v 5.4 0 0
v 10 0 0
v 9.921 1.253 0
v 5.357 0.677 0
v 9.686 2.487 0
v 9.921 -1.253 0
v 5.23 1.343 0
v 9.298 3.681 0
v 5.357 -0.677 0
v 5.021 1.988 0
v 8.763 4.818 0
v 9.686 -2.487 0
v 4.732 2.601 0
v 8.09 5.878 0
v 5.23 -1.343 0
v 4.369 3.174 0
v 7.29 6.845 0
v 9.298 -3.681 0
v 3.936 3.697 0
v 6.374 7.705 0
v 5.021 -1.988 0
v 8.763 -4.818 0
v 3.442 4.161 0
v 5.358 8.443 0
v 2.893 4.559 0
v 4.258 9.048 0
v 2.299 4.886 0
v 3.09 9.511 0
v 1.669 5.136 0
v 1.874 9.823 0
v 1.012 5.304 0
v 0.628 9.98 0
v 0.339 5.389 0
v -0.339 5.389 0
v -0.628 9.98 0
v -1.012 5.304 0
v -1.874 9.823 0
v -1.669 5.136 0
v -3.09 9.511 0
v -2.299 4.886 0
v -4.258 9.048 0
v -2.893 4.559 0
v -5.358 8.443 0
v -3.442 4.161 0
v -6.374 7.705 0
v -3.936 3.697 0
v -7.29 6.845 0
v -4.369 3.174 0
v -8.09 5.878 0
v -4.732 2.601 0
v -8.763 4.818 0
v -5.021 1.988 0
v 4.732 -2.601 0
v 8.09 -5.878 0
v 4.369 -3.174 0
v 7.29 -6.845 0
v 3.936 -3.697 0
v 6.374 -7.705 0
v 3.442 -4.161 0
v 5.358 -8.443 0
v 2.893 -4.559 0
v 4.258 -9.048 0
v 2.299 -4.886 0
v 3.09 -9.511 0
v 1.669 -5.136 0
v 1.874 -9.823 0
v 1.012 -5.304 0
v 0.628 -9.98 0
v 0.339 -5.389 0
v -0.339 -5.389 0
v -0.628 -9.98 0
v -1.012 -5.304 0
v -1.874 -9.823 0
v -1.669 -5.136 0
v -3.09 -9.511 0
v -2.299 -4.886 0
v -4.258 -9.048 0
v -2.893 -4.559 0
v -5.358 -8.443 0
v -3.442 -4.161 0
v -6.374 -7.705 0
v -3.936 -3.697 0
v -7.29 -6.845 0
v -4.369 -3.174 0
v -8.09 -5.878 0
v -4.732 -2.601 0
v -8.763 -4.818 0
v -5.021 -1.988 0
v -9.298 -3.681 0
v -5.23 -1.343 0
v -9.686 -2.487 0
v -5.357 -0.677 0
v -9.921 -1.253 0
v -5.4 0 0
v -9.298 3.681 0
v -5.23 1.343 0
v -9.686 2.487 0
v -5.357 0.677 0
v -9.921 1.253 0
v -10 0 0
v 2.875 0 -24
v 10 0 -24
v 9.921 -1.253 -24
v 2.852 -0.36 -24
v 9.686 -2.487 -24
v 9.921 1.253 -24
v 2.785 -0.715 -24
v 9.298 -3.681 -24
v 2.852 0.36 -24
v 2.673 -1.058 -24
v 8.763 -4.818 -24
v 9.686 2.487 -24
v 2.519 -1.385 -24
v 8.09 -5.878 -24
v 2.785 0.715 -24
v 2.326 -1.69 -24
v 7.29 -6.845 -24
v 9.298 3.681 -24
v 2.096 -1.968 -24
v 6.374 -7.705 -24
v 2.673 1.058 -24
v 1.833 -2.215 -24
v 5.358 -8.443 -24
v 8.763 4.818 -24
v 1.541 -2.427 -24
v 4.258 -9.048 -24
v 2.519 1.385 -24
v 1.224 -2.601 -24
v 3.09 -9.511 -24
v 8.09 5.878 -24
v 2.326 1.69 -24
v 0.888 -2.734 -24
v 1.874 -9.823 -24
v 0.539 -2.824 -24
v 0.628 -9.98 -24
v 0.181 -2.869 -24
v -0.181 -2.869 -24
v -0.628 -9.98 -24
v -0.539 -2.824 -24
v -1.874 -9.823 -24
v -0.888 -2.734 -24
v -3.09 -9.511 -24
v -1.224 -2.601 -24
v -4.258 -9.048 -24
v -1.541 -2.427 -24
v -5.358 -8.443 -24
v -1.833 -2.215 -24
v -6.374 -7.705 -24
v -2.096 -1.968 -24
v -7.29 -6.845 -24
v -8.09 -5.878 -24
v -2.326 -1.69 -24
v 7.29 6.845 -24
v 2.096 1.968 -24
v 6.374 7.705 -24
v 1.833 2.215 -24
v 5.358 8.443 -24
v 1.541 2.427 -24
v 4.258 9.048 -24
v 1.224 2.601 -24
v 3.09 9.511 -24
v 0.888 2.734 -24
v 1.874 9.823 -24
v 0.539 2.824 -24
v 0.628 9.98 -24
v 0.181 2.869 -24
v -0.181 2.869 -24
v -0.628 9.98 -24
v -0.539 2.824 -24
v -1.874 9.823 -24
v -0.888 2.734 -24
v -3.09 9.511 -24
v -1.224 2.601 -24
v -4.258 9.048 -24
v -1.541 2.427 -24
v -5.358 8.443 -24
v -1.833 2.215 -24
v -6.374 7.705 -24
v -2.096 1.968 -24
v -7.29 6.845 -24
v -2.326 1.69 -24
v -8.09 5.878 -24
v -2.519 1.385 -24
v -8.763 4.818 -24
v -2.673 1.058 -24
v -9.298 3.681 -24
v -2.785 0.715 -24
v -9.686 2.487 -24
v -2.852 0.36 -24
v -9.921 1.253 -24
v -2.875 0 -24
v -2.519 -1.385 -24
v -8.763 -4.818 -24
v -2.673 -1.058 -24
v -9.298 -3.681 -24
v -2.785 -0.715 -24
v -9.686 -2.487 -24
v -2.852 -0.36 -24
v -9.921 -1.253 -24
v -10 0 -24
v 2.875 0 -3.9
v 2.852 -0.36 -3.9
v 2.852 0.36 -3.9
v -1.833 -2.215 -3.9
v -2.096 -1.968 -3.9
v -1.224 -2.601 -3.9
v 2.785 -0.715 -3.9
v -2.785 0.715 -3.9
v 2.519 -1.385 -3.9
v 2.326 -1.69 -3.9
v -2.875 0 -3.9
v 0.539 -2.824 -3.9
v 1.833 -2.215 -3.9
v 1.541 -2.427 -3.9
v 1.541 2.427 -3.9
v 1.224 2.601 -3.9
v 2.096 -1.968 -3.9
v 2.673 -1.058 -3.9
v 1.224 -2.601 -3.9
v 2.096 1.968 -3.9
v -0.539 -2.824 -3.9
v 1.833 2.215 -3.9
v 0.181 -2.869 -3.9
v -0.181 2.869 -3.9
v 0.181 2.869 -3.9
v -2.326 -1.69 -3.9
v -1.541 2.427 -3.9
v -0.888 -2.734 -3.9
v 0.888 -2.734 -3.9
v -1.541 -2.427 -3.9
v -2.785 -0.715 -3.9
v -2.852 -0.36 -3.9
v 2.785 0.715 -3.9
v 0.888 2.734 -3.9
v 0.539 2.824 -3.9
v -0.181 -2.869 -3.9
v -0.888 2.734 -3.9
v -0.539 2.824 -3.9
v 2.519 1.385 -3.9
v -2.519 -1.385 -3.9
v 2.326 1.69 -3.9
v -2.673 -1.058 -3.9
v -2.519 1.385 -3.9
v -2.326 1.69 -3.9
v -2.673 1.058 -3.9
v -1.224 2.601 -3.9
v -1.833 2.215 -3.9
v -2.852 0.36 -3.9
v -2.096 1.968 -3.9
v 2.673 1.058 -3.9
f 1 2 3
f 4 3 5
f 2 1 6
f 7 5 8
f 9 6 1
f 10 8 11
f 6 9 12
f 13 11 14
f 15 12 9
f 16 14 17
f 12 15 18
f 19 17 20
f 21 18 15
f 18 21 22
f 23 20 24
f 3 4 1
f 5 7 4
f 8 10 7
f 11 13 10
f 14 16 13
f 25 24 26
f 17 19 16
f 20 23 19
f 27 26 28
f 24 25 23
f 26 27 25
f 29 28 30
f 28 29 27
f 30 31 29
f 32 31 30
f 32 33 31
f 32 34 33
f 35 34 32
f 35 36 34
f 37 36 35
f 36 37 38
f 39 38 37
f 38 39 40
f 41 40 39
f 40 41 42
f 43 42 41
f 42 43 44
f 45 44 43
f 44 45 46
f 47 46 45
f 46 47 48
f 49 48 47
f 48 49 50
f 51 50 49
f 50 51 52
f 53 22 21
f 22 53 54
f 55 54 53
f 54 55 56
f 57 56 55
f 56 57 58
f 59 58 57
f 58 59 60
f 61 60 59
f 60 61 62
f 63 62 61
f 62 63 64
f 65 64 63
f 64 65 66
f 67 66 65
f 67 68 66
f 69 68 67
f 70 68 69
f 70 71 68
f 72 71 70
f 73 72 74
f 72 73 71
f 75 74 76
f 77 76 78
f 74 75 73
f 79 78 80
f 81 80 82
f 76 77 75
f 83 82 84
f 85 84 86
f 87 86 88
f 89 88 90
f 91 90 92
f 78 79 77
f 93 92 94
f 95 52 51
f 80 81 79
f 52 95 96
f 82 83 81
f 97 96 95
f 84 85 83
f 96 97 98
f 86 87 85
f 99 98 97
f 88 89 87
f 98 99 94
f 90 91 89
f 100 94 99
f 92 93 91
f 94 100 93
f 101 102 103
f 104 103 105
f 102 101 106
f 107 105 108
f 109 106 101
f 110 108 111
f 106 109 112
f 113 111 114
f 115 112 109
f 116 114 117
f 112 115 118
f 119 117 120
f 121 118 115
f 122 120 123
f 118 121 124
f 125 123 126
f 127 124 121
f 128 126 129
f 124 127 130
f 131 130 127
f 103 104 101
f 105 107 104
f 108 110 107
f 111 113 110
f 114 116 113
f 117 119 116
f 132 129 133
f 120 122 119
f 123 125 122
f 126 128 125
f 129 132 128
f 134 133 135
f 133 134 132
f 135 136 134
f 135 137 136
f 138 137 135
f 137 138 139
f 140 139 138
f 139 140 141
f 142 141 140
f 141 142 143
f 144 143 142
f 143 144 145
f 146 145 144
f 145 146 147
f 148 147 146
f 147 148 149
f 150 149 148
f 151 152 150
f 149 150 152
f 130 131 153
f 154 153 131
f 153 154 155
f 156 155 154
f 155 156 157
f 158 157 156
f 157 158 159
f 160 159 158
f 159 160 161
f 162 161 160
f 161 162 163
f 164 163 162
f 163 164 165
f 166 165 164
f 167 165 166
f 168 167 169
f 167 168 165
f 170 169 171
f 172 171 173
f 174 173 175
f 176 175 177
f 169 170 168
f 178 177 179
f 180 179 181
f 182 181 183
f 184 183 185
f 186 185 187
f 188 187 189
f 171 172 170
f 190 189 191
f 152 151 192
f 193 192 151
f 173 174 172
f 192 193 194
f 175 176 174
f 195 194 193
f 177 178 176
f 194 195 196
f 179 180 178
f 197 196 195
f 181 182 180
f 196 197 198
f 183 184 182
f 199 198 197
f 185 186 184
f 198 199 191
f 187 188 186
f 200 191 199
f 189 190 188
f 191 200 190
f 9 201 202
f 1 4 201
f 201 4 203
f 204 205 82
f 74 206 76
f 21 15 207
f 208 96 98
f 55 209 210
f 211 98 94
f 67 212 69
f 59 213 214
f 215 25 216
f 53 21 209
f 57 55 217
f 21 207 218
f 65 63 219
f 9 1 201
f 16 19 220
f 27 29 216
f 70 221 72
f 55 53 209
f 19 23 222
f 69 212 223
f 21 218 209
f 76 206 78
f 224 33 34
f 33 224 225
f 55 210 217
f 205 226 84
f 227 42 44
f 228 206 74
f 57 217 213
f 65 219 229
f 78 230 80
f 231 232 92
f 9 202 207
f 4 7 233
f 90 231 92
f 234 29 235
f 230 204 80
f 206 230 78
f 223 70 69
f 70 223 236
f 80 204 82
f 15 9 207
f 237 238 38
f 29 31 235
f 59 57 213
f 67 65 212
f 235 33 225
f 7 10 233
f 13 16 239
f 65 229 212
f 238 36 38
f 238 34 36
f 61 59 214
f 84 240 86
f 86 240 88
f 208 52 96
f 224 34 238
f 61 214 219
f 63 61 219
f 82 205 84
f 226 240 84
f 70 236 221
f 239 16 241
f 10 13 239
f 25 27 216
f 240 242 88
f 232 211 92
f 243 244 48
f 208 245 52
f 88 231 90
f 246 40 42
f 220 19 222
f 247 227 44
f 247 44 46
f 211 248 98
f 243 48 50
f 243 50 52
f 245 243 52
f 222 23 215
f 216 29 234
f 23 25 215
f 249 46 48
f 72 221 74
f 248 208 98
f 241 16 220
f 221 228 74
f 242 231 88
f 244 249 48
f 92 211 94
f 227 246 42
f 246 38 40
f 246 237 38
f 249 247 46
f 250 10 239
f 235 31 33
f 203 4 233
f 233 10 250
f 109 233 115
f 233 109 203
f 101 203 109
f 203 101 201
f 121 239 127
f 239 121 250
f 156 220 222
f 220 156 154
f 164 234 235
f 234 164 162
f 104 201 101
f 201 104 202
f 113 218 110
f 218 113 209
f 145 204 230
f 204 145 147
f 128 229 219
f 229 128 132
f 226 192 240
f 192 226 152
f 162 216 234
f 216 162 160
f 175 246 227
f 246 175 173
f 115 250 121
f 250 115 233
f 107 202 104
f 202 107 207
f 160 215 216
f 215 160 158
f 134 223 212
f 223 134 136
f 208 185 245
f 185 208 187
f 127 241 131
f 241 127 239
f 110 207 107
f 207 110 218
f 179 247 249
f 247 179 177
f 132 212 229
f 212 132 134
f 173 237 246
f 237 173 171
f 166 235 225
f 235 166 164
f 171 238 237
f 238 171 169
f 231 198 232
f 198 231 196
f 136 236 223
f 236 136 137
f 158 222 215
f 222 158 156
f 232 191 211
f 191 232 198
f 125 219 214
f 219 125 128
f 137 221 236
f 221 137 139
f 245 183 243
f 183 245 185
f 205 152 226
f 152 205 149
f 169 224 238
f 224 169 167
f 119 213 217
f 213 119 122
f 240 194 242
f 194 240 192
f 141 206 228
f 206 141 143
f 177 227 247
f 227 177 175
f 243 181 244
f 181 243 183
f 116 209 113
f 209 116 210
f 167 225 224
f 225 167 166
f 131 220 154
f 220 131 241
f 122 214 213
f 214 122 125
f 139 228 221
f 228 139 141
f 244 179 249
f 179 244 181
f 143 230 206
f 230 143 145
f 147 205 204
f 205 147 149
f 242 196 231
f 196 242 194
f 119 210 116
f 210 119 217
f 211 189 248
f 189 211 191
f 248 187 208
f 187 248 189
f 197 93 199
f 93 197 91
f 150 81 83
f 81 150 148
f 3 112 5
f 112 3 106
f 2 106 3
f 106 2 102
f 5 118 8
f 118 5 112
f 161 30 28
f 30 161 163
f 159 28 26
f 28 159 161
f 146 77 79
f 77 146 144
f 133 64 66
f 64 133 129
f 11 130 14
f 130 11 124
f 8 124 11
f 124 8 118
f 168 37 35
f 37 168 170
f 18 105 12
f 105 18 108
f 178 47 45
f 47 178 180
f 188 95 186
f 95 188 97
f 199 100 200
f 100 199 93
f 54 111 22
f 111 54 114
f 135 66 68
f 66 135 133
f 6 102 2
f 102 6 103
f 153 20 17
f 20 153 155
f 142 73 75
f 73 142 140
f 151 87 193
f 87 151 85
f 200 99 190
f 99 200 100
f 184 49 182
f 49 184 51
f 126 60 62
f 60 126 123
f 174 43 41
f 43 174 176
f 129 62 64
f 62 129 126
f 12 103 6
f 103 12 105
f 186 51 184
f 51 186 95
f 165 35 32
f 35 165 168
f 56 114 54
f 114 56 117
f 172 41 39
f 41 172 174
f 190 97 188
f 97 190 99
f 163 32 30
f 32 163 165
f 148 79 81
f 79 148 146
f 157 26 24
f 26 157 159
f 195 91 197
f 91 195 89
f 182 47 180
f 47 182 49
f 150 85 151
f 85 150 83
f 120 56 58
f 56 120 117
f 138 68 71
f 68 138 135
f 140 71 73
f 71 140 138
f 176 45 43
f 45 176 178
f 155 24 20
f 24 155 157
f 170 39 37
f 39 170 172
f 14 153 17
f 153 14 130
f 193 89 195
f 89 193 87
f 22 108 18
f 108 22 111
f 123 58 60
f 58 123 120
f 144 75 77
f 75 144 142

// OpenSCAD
$fn = 50;


difference() {
	union() {
		translate(v = [0, 0, -24.0000000000]) {
			cylinder(h = 24, r = 10.0000000000);
		}
		cylinder(h = 0, r = 13.0000000000);
	}
	union() {
		translate(v = [0, 0, 0]) {
			rotate(a = [0, 0, 0]) {
				difference() {
					union() {
						#translate(v = [0, 0, -24.0000000000]) {
							cylinder(h = 24, r = 2.6000000000);
						}
						#translate(v = [0, 0, -3.9000000000]) {
							cylinder(h = 3.9000000000, r1 = 2.8750000000, r2 = 5.4000000000);
						}
						#translate(v = [0, 0, -24.0000000000]) {
							cylinder(h = 24, r = 2.8750000000);
						}
						#translate(v = [0, 0, -24.0000000000]) {
							cylinder(h = 24, r = 2.6000000000);
						}
					}
					union();
				}
			}
		}
	}
}
